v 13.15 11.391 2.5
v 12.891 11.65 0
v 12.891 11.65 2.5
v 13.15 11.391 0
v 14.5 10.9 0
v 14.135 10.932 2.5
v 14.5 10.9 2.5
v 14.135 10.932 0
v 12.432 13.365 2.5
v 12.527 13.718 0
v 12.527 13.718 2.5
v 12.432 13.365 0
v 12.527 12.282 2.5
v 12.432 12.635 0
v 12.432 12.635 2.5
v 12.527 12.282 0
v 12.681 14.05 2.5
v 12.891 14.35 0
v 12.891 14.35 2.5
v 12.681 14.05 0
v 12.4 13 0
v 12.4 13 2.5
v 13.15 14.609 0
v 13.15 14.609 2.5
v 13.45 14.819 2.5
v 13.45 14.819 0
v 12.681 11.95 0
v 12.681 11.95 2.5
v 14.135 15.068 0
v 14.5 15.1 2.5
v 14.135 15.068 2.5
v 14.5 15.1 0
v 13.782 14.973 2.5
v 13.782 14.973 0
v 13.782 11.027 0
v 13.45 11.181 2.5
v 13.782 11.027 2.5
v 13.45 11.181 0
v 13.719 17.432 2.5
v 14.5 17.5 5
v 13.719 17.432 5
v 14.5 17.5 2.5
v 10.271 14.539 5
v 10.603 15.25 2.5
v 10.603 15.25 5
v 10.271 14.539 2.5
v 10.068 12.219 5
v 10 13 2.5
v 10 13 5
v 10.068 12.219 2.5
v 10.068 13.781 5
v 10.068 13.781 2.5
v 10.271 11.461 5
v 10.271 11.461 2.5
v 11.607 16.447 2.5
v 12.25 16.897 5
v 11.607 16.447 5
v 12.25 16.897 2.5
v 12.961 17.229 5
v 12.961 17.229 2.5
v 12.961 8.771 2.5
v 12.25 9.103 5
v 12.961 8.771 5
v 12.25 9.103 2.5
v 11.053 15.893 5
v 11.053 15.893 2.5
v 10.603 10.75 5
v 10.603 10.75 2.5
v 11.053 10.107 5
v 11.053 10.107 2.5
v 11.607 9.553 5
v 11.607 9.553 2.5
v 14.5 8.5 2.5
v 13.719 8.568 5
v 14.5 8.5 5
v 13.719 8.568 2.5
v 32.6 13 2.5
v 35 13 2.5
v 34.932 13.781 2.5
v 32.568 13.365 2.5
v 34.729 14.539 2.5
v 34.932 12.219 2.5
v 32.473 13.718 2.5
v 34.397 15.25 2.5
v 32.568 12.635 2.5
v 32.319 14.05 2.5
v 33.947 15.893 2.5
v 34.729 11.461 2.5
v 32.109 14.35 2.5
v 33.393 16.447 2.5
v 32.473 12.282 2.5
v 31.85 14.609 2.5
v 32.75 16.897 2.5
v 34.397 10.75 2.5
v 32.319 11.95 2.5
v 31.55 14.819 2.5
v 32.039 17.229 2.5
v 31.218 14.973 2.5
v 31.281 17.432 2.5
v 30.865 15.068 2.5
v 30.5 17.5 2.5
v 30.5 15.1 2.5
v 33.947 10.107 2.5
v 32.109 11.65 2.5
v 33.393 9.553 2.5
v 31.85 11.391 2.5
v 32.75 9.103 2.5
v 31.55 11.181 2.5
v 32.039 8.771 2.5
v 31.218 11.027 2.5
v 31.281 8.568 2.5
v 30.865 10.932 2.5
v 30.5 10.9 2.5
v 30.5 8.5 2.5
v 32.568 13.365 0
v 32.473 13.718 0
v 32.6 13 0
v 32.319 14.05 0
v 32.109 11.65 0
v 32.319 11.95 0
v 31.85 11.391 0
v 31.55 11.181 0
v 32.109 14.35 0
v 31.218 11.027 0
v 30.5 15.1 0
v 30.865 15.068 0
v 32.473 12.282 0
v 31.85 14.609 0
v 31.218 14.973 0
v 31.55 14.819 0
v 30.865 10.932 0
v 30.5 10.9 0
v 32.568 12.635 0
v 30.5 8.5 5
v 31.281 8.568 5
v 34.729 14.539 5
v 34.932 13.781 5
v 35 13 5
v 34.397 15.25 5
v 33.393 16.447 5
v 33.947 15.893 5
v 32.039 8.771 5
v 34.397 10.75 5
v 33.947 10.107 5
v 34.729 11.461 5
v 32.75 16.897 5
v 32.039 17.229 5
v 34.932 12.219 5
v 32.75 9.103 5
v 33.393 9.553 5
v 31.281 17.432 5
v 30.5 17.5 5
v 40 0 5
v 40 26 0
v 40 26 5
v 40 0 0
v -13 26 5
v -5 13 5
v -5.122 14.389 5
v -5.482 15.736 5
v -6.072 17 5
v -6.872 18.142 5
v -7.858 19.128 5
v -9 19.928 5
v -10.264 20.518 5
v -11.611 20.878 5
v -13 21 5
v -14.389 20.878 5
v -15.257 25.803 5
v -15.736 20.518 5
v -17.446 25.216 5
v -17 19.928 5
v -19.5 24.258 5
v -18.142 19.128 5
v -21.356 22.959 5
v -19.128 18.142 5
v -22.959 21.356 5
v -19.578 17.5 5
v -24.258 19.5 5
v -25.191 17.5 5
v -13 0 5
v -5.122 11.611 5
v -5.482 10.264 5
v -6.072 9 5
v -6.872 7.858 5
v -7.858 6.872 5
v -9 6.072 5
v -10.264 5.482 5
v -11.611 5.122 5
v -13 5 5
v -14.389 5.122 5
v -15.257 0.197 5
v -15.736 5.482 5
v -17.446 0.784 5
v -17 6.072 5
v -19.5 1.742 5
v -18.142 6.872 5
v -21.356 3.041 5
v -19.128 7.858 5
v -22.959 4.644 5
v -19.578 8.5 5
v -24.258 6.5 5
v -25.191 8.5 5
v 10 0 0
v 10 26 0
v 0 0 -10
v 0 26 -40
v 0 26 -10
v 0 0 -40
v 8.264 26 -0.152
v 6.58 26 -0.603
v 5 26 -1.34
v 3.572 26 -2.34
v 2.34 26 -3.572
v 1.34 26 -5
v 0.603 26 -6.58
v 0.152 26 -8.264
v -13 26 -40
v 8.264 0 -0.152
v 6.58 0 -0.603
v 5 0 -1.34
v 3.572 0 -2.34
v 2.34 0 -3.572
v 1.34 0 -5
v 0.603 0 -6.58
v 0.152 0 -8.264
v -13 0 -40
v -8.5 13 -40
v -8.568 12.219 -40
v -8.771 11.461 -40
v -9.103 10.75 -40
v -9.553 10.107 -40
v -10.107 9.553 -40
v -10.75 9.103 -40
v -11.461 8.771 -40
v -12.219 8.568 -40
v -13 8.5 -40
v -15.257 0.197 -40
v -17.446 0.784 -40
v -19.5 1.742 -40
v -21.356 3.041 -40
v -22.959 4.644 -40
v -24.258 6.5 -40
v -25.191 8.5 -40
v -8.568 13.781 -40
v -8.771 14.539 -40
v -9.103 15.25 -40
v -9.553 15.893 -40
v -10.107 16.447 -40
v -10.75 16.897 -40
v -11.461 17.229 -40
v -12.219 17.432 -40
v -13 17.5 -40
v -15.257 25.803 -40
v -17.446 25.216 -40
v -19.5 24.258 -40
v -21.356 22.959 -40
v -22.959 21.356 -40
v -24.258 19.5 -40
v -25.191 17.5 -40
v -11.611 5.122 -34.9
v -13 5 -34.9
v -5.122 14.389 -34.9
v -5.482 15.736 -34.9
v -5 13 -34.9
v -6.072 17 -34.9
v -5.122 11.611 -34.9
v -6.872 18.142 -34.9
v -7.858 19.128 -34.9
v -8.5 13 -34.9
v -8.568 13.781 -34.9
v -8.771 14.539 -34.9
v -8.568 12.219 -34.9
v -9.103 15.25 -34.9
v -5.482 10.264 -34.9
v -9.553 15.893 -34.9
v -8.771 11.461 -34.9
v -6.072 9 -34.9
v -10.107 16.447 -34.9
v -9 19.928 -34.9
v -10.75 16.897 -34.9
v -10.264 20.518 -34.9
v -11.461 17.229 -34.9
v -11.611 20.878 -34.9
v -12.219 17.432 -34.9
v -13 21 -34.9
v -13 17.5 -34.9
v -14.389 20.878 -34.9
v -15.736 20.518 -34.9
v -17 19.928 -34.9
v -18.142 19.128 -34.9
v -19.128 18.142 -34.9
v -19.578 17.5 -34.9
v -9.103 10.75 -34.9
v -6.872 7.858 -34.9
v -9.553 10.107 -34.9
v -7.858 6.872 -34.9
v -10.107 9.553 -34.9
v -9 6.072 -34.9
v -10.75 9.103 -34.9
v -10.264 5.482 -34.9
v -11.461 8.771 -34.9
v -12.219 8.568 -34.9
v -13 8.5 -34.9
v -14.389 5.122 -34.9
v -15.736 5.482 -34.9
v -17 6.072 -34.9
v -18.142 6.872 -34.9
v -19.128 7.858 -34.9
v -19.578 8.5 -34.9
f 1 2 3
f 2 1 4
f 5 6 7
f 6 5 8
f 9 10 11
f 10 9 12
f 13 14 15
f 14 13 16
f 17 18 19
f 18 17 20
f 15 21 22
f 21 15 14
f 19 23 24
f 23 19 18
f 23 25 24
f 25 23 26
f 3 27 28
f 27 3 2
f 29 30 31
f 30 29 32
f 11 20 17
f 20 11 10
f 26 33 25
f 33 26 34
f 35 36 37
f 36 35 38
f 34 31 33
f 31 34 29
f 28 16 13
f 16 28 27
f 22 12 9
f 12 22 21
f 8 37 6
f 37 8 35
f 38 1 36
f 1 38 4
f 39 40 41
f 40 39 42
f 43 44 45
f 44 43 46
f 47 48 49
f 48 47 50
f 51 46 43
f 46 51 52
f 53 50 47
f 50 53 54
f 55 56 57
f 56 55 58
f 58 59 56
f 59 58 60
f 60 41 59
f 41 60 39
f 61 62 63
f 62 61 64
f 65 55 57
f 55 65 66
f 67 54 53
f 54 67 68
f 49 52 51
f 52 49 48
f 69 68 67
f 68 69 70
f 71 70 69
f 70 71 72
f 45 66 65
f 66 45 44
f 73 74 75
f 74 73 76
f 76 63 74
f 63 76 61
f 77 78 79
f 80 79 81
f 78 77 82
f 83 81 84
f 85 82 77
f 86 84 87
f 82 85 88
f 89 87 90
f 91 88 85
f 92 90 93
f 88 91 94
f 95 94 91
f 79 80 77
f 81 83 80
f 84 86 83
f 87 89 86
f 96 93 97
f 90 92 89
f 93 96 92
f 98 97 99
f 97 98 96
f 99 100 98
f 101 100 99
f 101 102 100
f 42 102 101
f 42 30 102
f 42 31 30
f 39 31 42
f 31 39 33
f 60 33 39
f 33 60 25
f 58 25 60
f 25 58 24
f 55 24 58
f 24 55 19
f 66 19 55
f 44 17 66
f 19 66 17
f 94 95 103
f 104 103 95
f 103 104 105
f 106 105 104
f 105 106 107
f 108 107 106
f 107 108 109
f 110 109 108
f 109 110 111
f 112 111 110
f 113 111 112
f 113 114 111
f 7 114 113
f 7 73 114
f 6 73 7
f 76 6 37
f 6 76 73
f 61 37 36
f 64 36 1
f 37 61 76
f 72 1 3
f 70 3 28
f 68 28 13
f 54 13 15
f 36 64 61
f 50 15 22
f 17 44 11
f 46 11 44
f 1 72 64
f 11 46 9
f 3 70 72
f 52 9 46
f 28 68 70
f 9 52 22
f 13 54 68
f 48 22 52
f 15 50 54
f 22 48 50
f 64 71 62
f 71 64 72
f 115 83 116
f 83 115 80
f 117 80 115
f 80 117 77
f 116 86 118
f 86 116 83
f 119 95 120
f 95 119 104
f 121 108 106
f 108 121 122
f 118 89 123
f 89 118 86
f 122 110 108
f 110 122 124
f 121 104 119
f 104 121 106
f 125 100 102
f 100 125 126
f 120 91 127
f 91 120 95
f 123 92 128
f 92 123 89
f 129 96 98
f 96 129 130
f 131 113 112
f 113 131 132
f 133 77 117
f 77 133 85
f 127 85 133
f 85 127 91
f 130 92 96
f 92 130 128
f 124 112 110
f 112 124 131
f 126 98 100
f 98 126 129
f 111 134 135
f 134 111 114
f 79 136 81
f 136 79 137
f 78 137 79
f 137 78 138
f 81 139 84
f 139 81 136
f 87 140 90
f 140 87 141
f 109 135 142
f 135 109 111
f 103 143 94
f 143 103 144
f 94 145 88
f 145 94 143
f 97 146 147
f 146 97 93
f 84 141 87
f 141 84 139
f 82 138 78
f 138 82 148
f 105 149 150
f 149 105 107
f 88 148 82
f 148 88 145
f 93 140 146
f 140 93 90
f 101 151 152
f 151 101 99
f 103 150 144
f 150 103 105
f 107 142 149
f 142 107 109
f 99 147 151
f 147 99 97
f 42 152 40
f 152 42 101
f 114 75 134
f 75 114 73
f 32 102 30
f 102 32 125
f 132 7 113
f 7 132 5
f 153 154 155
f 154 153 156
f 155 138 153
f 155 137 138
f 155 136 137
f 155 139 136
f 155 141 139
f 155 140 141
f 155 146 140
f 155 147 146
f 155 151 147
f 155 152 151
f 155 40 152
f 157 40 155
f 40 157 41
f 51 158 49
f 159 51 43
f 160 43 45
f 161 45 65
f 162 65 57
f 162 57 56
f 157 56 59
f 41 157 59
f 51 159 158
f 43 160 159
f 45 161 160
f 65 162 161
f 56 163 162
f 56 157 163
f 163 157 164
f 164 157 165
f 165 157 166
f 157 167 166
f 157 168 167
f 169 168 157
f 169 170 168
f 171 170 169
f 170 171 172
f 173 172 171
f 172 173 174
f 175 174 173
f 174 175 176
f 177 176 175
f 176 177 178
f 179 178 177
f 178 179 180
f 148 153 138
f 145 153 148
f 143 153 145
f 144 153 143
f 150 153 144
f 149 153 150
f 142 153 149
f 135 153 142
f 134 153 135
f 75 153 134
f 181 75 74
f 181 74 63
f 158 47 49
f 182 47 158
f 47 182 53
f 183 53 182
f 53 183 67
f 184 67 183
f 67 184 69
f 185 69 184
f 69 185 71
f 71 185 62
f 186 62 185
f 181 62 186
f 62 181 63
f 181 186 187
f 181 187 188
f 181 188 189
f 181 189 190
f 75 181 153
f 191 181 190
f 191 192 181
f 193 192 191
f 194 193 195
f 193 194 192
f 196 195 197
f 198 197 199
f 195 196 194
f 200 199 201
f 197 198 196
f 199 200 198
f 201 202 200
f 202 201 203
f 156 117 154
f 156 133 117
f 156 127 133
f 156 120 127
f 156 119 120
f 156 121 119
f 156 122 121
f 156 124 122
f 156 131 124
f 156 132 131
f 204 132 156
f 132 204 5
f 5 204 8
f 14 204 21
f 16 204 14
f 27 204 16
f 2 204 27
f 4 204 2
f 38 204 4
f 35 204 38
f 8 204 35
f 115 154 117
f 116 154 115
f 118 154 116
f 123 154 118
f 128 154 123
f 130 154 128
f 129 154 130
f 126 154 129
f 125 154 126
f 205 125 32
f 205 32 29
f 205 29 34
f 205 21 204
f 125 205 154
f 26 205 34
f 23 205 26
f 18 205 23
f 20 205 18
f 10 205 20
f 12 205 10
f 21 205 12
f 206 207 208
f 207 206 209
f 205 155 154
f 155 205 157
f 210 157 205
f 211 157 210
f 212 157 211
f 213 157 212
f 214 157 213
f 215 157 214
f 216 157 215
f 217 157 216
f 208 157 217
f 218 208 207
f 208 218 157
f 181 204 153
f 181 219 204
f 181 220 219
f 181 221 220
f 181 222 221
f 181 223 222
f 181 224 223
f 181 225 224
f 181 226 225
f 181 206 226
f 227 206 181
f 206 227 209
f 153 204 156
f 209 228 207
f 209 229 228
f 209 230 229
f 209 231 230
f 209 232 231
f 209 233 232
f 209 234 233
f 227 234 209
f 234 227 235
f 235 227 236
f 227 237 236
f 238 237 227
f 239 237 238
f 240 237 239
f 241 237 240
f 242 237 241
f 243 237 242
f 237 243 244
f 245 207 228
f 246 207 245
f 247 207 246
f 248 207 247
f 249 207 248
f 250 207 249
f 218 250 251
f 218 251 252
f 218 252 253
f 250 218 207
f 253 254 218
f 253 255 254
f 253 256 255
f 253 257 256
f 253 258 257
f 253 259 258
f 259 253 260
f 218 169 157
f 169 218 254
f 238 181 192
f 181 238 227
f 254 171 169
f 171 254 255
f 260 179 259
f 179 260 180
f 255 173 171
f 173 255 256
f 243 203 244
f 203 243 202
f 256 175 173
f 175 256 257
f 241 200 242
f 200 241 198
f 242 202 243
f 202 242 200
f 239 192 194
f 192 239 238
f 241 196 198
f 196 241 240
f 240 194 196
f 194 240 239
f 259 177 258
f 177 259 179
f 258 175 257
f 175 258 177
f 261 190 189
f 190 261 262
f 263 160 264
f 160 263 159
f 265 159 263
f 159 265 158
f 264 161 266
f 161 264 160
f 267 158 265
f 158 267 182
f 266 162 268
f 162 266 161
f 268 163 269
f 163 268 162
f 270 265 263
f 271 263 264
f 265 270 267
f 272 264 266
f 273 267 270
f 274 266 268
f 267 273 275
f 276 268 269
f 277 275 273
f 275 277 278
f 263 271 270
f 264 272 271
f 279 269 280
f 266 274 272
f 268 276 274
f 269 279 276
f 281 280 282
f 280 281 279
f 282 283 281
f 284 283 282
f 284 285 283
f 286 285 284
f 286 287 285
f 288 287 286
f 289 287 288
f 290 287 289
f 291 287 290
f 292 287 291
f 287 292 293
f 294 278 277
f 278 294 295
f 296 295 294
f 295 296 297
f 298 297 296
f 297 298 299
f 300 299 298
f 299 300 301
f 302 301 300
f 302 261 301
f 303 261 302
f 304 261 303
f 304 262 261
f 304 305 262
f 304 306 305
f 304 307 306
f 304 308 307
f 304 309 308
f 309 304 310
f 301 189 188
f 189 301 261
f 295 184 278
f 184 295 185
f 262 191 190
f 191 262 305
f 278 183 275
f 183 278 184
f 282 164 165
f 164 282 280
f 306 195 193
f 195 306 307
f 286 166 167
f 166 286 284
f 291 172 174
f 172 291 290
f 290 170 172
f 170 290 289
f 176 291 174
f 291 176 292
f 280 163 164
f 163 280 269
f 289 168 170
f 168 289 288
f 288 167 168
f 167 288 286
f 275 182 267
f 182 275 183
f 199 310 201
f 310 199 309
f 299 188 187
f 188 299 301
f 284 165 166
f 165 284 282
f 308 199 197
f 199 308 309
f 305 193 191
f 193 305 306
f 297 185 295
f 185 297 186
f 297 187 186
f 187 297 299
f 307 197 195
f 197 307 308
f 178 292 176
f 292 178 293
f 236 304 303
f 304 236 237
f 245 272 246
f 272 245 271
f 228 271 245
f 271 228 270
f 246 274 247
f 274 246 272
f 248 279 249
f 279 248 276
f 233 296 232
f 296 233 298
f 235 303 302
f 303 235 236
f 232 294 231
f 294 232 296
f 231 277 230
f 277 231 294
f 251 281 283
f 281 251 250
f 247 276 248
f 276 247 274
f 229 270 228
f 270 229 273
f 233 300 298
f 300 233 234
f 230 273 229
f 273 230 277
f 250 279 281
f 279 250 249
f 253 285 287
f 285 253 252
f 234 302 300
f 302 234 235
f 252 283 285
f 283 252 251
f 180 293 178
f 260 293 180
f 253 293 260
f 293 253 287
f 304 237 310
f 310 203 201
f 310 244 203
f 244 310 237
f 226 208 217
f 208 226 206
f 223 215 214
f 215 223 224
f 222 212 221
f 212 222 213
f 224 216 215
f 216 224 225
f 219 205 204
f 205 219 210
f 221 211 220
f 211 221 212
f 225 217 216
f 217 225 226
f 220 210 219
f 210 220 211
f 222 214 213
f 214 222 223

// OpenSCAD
/* [General Dimensions] */
//Wall thickness
thickness=5;
//Radius of the rounded corner (corner of the amp)
roundedCorner_radius=10;
//Length of the top of the holter (must be long enough to reach a screw hole).
topBar_length=40;
//Distance between the end of the upper tab and the start of the screw hole. 
screwHole_border2borderDistance=5;

/* [Jack Dimensions] */
//diameter of the Jack head hole
jackHead_diameter=16;
//Height of the holder
jackHead_length=40;
//Diameter of the cable hole. Will be also used for the slot
jackCable_diameter=9;

/* [Scew hole Dimensions] */
//Diameter of the shaft hole
screwShaft_diameter=4.2;
//Diameter for the head hole
screwHead_diameter=9;


/* [Hidden] */
$fn=36;
marginForOverlap = 0.1;
defaultHoleLength=100;

topBar_with=jackHead_diameter+thickness*2;

topBar_dim= [topBar_length, topBar_with, thickness];

screwHole_border2borderDistance=5;
screwSlot_length=topBar_length-roundedCorner_radius-screwHole_border2borderDistance-screwHead_diameter;

elongatedScrewLength=screwSlot_length+screwHead_diameter;


screw_distance=topBar_length-(elongatedScrewLength/2)-screwHole_border2borderDistance;
screw_position=[screw_distance, topBar_with/2, thickness/2];

marginForOverlap=0.1;



topBar();
holder();
difference(){
		translate([0,0,-roundedCorner_radius])cube([roundedCorner_radius,topBar_with,roundedCorner_radius]);
	translate([roundedCorner_radius,topBar_with+marginForOverlap,-roundedCorner_radius])rotate([90,0,0])cylinder(r=roundedCorner_radius, h=topBar_with+marginForOverlap*2);
}
module topBar(){
	difference(){
	cube(topBar_dim);
	translate(screw_position) elongatedScrewHole(screwShaft_diameter, screwHead_diameter,screwSlot_length);
	}
}

module holder(){
	holder_length=jackHead_diameter+thickness*2;
	holder_height=jackHead_length+thickness;
	box_length =holder_length/2;
	
	translate([-box_length,0,-(holder_height-thickness)]){
		difference(){
			union(){
				cube([box_length,topBar_with,holder_height]);
				translate([0,topBar_with/2,0]){
						cylinder(d=topBar_with, h=holder_height);
				}
			}
			translate([0,topBar_with/2,0]){
				translate([0,0,thickness+marginForOverlap])cylinder(d=jackHead_diameter, h=holder_height-thickness);
				translate([0,0,-thickness/2])cylinder(d=jackCable_diameter, h=thickness*2);
			}
			slot_position=[-holder_length/2,topBar_with/2-jackCable_diameter/2,-marginForOverlap];
			translate(slot_position)cube([holder_length/2,jackCable_diameter,holder_height+marginForOverlap*2]);
		}
	}
}

module screwHole(shaftDiam, headDiam, shaftLength=defaultHoleLength, headLength=defaultHoleLength){
		translate([0,0,-shaftLength+marginForOverlap])cylinder(d=shaftDiam, h=shaftLength);
		cylinder(d=headDiam, h=headLength);
}

module elongatedScrewHole(shaftDiam, headDiam, elongation, shaftLength=defaultHoleLength, headLength=defaultHoleLength ){
	translate([-elongation/2,0,0])screwHole(shaftDiam, headDiam, shaftLength, headLength);
	translate([0,0,headLength/2])cube([elongation,headDiam,headLength], center=true);
		translate([0,0,-shaftLength/2+marginForOverlap])cube([elongation,shaftDiam,shaftLength], center=true);
	translate([elongation/2,0,0])screwHole(shaftDiam, headDiam, shaftLength, headLength);
}
